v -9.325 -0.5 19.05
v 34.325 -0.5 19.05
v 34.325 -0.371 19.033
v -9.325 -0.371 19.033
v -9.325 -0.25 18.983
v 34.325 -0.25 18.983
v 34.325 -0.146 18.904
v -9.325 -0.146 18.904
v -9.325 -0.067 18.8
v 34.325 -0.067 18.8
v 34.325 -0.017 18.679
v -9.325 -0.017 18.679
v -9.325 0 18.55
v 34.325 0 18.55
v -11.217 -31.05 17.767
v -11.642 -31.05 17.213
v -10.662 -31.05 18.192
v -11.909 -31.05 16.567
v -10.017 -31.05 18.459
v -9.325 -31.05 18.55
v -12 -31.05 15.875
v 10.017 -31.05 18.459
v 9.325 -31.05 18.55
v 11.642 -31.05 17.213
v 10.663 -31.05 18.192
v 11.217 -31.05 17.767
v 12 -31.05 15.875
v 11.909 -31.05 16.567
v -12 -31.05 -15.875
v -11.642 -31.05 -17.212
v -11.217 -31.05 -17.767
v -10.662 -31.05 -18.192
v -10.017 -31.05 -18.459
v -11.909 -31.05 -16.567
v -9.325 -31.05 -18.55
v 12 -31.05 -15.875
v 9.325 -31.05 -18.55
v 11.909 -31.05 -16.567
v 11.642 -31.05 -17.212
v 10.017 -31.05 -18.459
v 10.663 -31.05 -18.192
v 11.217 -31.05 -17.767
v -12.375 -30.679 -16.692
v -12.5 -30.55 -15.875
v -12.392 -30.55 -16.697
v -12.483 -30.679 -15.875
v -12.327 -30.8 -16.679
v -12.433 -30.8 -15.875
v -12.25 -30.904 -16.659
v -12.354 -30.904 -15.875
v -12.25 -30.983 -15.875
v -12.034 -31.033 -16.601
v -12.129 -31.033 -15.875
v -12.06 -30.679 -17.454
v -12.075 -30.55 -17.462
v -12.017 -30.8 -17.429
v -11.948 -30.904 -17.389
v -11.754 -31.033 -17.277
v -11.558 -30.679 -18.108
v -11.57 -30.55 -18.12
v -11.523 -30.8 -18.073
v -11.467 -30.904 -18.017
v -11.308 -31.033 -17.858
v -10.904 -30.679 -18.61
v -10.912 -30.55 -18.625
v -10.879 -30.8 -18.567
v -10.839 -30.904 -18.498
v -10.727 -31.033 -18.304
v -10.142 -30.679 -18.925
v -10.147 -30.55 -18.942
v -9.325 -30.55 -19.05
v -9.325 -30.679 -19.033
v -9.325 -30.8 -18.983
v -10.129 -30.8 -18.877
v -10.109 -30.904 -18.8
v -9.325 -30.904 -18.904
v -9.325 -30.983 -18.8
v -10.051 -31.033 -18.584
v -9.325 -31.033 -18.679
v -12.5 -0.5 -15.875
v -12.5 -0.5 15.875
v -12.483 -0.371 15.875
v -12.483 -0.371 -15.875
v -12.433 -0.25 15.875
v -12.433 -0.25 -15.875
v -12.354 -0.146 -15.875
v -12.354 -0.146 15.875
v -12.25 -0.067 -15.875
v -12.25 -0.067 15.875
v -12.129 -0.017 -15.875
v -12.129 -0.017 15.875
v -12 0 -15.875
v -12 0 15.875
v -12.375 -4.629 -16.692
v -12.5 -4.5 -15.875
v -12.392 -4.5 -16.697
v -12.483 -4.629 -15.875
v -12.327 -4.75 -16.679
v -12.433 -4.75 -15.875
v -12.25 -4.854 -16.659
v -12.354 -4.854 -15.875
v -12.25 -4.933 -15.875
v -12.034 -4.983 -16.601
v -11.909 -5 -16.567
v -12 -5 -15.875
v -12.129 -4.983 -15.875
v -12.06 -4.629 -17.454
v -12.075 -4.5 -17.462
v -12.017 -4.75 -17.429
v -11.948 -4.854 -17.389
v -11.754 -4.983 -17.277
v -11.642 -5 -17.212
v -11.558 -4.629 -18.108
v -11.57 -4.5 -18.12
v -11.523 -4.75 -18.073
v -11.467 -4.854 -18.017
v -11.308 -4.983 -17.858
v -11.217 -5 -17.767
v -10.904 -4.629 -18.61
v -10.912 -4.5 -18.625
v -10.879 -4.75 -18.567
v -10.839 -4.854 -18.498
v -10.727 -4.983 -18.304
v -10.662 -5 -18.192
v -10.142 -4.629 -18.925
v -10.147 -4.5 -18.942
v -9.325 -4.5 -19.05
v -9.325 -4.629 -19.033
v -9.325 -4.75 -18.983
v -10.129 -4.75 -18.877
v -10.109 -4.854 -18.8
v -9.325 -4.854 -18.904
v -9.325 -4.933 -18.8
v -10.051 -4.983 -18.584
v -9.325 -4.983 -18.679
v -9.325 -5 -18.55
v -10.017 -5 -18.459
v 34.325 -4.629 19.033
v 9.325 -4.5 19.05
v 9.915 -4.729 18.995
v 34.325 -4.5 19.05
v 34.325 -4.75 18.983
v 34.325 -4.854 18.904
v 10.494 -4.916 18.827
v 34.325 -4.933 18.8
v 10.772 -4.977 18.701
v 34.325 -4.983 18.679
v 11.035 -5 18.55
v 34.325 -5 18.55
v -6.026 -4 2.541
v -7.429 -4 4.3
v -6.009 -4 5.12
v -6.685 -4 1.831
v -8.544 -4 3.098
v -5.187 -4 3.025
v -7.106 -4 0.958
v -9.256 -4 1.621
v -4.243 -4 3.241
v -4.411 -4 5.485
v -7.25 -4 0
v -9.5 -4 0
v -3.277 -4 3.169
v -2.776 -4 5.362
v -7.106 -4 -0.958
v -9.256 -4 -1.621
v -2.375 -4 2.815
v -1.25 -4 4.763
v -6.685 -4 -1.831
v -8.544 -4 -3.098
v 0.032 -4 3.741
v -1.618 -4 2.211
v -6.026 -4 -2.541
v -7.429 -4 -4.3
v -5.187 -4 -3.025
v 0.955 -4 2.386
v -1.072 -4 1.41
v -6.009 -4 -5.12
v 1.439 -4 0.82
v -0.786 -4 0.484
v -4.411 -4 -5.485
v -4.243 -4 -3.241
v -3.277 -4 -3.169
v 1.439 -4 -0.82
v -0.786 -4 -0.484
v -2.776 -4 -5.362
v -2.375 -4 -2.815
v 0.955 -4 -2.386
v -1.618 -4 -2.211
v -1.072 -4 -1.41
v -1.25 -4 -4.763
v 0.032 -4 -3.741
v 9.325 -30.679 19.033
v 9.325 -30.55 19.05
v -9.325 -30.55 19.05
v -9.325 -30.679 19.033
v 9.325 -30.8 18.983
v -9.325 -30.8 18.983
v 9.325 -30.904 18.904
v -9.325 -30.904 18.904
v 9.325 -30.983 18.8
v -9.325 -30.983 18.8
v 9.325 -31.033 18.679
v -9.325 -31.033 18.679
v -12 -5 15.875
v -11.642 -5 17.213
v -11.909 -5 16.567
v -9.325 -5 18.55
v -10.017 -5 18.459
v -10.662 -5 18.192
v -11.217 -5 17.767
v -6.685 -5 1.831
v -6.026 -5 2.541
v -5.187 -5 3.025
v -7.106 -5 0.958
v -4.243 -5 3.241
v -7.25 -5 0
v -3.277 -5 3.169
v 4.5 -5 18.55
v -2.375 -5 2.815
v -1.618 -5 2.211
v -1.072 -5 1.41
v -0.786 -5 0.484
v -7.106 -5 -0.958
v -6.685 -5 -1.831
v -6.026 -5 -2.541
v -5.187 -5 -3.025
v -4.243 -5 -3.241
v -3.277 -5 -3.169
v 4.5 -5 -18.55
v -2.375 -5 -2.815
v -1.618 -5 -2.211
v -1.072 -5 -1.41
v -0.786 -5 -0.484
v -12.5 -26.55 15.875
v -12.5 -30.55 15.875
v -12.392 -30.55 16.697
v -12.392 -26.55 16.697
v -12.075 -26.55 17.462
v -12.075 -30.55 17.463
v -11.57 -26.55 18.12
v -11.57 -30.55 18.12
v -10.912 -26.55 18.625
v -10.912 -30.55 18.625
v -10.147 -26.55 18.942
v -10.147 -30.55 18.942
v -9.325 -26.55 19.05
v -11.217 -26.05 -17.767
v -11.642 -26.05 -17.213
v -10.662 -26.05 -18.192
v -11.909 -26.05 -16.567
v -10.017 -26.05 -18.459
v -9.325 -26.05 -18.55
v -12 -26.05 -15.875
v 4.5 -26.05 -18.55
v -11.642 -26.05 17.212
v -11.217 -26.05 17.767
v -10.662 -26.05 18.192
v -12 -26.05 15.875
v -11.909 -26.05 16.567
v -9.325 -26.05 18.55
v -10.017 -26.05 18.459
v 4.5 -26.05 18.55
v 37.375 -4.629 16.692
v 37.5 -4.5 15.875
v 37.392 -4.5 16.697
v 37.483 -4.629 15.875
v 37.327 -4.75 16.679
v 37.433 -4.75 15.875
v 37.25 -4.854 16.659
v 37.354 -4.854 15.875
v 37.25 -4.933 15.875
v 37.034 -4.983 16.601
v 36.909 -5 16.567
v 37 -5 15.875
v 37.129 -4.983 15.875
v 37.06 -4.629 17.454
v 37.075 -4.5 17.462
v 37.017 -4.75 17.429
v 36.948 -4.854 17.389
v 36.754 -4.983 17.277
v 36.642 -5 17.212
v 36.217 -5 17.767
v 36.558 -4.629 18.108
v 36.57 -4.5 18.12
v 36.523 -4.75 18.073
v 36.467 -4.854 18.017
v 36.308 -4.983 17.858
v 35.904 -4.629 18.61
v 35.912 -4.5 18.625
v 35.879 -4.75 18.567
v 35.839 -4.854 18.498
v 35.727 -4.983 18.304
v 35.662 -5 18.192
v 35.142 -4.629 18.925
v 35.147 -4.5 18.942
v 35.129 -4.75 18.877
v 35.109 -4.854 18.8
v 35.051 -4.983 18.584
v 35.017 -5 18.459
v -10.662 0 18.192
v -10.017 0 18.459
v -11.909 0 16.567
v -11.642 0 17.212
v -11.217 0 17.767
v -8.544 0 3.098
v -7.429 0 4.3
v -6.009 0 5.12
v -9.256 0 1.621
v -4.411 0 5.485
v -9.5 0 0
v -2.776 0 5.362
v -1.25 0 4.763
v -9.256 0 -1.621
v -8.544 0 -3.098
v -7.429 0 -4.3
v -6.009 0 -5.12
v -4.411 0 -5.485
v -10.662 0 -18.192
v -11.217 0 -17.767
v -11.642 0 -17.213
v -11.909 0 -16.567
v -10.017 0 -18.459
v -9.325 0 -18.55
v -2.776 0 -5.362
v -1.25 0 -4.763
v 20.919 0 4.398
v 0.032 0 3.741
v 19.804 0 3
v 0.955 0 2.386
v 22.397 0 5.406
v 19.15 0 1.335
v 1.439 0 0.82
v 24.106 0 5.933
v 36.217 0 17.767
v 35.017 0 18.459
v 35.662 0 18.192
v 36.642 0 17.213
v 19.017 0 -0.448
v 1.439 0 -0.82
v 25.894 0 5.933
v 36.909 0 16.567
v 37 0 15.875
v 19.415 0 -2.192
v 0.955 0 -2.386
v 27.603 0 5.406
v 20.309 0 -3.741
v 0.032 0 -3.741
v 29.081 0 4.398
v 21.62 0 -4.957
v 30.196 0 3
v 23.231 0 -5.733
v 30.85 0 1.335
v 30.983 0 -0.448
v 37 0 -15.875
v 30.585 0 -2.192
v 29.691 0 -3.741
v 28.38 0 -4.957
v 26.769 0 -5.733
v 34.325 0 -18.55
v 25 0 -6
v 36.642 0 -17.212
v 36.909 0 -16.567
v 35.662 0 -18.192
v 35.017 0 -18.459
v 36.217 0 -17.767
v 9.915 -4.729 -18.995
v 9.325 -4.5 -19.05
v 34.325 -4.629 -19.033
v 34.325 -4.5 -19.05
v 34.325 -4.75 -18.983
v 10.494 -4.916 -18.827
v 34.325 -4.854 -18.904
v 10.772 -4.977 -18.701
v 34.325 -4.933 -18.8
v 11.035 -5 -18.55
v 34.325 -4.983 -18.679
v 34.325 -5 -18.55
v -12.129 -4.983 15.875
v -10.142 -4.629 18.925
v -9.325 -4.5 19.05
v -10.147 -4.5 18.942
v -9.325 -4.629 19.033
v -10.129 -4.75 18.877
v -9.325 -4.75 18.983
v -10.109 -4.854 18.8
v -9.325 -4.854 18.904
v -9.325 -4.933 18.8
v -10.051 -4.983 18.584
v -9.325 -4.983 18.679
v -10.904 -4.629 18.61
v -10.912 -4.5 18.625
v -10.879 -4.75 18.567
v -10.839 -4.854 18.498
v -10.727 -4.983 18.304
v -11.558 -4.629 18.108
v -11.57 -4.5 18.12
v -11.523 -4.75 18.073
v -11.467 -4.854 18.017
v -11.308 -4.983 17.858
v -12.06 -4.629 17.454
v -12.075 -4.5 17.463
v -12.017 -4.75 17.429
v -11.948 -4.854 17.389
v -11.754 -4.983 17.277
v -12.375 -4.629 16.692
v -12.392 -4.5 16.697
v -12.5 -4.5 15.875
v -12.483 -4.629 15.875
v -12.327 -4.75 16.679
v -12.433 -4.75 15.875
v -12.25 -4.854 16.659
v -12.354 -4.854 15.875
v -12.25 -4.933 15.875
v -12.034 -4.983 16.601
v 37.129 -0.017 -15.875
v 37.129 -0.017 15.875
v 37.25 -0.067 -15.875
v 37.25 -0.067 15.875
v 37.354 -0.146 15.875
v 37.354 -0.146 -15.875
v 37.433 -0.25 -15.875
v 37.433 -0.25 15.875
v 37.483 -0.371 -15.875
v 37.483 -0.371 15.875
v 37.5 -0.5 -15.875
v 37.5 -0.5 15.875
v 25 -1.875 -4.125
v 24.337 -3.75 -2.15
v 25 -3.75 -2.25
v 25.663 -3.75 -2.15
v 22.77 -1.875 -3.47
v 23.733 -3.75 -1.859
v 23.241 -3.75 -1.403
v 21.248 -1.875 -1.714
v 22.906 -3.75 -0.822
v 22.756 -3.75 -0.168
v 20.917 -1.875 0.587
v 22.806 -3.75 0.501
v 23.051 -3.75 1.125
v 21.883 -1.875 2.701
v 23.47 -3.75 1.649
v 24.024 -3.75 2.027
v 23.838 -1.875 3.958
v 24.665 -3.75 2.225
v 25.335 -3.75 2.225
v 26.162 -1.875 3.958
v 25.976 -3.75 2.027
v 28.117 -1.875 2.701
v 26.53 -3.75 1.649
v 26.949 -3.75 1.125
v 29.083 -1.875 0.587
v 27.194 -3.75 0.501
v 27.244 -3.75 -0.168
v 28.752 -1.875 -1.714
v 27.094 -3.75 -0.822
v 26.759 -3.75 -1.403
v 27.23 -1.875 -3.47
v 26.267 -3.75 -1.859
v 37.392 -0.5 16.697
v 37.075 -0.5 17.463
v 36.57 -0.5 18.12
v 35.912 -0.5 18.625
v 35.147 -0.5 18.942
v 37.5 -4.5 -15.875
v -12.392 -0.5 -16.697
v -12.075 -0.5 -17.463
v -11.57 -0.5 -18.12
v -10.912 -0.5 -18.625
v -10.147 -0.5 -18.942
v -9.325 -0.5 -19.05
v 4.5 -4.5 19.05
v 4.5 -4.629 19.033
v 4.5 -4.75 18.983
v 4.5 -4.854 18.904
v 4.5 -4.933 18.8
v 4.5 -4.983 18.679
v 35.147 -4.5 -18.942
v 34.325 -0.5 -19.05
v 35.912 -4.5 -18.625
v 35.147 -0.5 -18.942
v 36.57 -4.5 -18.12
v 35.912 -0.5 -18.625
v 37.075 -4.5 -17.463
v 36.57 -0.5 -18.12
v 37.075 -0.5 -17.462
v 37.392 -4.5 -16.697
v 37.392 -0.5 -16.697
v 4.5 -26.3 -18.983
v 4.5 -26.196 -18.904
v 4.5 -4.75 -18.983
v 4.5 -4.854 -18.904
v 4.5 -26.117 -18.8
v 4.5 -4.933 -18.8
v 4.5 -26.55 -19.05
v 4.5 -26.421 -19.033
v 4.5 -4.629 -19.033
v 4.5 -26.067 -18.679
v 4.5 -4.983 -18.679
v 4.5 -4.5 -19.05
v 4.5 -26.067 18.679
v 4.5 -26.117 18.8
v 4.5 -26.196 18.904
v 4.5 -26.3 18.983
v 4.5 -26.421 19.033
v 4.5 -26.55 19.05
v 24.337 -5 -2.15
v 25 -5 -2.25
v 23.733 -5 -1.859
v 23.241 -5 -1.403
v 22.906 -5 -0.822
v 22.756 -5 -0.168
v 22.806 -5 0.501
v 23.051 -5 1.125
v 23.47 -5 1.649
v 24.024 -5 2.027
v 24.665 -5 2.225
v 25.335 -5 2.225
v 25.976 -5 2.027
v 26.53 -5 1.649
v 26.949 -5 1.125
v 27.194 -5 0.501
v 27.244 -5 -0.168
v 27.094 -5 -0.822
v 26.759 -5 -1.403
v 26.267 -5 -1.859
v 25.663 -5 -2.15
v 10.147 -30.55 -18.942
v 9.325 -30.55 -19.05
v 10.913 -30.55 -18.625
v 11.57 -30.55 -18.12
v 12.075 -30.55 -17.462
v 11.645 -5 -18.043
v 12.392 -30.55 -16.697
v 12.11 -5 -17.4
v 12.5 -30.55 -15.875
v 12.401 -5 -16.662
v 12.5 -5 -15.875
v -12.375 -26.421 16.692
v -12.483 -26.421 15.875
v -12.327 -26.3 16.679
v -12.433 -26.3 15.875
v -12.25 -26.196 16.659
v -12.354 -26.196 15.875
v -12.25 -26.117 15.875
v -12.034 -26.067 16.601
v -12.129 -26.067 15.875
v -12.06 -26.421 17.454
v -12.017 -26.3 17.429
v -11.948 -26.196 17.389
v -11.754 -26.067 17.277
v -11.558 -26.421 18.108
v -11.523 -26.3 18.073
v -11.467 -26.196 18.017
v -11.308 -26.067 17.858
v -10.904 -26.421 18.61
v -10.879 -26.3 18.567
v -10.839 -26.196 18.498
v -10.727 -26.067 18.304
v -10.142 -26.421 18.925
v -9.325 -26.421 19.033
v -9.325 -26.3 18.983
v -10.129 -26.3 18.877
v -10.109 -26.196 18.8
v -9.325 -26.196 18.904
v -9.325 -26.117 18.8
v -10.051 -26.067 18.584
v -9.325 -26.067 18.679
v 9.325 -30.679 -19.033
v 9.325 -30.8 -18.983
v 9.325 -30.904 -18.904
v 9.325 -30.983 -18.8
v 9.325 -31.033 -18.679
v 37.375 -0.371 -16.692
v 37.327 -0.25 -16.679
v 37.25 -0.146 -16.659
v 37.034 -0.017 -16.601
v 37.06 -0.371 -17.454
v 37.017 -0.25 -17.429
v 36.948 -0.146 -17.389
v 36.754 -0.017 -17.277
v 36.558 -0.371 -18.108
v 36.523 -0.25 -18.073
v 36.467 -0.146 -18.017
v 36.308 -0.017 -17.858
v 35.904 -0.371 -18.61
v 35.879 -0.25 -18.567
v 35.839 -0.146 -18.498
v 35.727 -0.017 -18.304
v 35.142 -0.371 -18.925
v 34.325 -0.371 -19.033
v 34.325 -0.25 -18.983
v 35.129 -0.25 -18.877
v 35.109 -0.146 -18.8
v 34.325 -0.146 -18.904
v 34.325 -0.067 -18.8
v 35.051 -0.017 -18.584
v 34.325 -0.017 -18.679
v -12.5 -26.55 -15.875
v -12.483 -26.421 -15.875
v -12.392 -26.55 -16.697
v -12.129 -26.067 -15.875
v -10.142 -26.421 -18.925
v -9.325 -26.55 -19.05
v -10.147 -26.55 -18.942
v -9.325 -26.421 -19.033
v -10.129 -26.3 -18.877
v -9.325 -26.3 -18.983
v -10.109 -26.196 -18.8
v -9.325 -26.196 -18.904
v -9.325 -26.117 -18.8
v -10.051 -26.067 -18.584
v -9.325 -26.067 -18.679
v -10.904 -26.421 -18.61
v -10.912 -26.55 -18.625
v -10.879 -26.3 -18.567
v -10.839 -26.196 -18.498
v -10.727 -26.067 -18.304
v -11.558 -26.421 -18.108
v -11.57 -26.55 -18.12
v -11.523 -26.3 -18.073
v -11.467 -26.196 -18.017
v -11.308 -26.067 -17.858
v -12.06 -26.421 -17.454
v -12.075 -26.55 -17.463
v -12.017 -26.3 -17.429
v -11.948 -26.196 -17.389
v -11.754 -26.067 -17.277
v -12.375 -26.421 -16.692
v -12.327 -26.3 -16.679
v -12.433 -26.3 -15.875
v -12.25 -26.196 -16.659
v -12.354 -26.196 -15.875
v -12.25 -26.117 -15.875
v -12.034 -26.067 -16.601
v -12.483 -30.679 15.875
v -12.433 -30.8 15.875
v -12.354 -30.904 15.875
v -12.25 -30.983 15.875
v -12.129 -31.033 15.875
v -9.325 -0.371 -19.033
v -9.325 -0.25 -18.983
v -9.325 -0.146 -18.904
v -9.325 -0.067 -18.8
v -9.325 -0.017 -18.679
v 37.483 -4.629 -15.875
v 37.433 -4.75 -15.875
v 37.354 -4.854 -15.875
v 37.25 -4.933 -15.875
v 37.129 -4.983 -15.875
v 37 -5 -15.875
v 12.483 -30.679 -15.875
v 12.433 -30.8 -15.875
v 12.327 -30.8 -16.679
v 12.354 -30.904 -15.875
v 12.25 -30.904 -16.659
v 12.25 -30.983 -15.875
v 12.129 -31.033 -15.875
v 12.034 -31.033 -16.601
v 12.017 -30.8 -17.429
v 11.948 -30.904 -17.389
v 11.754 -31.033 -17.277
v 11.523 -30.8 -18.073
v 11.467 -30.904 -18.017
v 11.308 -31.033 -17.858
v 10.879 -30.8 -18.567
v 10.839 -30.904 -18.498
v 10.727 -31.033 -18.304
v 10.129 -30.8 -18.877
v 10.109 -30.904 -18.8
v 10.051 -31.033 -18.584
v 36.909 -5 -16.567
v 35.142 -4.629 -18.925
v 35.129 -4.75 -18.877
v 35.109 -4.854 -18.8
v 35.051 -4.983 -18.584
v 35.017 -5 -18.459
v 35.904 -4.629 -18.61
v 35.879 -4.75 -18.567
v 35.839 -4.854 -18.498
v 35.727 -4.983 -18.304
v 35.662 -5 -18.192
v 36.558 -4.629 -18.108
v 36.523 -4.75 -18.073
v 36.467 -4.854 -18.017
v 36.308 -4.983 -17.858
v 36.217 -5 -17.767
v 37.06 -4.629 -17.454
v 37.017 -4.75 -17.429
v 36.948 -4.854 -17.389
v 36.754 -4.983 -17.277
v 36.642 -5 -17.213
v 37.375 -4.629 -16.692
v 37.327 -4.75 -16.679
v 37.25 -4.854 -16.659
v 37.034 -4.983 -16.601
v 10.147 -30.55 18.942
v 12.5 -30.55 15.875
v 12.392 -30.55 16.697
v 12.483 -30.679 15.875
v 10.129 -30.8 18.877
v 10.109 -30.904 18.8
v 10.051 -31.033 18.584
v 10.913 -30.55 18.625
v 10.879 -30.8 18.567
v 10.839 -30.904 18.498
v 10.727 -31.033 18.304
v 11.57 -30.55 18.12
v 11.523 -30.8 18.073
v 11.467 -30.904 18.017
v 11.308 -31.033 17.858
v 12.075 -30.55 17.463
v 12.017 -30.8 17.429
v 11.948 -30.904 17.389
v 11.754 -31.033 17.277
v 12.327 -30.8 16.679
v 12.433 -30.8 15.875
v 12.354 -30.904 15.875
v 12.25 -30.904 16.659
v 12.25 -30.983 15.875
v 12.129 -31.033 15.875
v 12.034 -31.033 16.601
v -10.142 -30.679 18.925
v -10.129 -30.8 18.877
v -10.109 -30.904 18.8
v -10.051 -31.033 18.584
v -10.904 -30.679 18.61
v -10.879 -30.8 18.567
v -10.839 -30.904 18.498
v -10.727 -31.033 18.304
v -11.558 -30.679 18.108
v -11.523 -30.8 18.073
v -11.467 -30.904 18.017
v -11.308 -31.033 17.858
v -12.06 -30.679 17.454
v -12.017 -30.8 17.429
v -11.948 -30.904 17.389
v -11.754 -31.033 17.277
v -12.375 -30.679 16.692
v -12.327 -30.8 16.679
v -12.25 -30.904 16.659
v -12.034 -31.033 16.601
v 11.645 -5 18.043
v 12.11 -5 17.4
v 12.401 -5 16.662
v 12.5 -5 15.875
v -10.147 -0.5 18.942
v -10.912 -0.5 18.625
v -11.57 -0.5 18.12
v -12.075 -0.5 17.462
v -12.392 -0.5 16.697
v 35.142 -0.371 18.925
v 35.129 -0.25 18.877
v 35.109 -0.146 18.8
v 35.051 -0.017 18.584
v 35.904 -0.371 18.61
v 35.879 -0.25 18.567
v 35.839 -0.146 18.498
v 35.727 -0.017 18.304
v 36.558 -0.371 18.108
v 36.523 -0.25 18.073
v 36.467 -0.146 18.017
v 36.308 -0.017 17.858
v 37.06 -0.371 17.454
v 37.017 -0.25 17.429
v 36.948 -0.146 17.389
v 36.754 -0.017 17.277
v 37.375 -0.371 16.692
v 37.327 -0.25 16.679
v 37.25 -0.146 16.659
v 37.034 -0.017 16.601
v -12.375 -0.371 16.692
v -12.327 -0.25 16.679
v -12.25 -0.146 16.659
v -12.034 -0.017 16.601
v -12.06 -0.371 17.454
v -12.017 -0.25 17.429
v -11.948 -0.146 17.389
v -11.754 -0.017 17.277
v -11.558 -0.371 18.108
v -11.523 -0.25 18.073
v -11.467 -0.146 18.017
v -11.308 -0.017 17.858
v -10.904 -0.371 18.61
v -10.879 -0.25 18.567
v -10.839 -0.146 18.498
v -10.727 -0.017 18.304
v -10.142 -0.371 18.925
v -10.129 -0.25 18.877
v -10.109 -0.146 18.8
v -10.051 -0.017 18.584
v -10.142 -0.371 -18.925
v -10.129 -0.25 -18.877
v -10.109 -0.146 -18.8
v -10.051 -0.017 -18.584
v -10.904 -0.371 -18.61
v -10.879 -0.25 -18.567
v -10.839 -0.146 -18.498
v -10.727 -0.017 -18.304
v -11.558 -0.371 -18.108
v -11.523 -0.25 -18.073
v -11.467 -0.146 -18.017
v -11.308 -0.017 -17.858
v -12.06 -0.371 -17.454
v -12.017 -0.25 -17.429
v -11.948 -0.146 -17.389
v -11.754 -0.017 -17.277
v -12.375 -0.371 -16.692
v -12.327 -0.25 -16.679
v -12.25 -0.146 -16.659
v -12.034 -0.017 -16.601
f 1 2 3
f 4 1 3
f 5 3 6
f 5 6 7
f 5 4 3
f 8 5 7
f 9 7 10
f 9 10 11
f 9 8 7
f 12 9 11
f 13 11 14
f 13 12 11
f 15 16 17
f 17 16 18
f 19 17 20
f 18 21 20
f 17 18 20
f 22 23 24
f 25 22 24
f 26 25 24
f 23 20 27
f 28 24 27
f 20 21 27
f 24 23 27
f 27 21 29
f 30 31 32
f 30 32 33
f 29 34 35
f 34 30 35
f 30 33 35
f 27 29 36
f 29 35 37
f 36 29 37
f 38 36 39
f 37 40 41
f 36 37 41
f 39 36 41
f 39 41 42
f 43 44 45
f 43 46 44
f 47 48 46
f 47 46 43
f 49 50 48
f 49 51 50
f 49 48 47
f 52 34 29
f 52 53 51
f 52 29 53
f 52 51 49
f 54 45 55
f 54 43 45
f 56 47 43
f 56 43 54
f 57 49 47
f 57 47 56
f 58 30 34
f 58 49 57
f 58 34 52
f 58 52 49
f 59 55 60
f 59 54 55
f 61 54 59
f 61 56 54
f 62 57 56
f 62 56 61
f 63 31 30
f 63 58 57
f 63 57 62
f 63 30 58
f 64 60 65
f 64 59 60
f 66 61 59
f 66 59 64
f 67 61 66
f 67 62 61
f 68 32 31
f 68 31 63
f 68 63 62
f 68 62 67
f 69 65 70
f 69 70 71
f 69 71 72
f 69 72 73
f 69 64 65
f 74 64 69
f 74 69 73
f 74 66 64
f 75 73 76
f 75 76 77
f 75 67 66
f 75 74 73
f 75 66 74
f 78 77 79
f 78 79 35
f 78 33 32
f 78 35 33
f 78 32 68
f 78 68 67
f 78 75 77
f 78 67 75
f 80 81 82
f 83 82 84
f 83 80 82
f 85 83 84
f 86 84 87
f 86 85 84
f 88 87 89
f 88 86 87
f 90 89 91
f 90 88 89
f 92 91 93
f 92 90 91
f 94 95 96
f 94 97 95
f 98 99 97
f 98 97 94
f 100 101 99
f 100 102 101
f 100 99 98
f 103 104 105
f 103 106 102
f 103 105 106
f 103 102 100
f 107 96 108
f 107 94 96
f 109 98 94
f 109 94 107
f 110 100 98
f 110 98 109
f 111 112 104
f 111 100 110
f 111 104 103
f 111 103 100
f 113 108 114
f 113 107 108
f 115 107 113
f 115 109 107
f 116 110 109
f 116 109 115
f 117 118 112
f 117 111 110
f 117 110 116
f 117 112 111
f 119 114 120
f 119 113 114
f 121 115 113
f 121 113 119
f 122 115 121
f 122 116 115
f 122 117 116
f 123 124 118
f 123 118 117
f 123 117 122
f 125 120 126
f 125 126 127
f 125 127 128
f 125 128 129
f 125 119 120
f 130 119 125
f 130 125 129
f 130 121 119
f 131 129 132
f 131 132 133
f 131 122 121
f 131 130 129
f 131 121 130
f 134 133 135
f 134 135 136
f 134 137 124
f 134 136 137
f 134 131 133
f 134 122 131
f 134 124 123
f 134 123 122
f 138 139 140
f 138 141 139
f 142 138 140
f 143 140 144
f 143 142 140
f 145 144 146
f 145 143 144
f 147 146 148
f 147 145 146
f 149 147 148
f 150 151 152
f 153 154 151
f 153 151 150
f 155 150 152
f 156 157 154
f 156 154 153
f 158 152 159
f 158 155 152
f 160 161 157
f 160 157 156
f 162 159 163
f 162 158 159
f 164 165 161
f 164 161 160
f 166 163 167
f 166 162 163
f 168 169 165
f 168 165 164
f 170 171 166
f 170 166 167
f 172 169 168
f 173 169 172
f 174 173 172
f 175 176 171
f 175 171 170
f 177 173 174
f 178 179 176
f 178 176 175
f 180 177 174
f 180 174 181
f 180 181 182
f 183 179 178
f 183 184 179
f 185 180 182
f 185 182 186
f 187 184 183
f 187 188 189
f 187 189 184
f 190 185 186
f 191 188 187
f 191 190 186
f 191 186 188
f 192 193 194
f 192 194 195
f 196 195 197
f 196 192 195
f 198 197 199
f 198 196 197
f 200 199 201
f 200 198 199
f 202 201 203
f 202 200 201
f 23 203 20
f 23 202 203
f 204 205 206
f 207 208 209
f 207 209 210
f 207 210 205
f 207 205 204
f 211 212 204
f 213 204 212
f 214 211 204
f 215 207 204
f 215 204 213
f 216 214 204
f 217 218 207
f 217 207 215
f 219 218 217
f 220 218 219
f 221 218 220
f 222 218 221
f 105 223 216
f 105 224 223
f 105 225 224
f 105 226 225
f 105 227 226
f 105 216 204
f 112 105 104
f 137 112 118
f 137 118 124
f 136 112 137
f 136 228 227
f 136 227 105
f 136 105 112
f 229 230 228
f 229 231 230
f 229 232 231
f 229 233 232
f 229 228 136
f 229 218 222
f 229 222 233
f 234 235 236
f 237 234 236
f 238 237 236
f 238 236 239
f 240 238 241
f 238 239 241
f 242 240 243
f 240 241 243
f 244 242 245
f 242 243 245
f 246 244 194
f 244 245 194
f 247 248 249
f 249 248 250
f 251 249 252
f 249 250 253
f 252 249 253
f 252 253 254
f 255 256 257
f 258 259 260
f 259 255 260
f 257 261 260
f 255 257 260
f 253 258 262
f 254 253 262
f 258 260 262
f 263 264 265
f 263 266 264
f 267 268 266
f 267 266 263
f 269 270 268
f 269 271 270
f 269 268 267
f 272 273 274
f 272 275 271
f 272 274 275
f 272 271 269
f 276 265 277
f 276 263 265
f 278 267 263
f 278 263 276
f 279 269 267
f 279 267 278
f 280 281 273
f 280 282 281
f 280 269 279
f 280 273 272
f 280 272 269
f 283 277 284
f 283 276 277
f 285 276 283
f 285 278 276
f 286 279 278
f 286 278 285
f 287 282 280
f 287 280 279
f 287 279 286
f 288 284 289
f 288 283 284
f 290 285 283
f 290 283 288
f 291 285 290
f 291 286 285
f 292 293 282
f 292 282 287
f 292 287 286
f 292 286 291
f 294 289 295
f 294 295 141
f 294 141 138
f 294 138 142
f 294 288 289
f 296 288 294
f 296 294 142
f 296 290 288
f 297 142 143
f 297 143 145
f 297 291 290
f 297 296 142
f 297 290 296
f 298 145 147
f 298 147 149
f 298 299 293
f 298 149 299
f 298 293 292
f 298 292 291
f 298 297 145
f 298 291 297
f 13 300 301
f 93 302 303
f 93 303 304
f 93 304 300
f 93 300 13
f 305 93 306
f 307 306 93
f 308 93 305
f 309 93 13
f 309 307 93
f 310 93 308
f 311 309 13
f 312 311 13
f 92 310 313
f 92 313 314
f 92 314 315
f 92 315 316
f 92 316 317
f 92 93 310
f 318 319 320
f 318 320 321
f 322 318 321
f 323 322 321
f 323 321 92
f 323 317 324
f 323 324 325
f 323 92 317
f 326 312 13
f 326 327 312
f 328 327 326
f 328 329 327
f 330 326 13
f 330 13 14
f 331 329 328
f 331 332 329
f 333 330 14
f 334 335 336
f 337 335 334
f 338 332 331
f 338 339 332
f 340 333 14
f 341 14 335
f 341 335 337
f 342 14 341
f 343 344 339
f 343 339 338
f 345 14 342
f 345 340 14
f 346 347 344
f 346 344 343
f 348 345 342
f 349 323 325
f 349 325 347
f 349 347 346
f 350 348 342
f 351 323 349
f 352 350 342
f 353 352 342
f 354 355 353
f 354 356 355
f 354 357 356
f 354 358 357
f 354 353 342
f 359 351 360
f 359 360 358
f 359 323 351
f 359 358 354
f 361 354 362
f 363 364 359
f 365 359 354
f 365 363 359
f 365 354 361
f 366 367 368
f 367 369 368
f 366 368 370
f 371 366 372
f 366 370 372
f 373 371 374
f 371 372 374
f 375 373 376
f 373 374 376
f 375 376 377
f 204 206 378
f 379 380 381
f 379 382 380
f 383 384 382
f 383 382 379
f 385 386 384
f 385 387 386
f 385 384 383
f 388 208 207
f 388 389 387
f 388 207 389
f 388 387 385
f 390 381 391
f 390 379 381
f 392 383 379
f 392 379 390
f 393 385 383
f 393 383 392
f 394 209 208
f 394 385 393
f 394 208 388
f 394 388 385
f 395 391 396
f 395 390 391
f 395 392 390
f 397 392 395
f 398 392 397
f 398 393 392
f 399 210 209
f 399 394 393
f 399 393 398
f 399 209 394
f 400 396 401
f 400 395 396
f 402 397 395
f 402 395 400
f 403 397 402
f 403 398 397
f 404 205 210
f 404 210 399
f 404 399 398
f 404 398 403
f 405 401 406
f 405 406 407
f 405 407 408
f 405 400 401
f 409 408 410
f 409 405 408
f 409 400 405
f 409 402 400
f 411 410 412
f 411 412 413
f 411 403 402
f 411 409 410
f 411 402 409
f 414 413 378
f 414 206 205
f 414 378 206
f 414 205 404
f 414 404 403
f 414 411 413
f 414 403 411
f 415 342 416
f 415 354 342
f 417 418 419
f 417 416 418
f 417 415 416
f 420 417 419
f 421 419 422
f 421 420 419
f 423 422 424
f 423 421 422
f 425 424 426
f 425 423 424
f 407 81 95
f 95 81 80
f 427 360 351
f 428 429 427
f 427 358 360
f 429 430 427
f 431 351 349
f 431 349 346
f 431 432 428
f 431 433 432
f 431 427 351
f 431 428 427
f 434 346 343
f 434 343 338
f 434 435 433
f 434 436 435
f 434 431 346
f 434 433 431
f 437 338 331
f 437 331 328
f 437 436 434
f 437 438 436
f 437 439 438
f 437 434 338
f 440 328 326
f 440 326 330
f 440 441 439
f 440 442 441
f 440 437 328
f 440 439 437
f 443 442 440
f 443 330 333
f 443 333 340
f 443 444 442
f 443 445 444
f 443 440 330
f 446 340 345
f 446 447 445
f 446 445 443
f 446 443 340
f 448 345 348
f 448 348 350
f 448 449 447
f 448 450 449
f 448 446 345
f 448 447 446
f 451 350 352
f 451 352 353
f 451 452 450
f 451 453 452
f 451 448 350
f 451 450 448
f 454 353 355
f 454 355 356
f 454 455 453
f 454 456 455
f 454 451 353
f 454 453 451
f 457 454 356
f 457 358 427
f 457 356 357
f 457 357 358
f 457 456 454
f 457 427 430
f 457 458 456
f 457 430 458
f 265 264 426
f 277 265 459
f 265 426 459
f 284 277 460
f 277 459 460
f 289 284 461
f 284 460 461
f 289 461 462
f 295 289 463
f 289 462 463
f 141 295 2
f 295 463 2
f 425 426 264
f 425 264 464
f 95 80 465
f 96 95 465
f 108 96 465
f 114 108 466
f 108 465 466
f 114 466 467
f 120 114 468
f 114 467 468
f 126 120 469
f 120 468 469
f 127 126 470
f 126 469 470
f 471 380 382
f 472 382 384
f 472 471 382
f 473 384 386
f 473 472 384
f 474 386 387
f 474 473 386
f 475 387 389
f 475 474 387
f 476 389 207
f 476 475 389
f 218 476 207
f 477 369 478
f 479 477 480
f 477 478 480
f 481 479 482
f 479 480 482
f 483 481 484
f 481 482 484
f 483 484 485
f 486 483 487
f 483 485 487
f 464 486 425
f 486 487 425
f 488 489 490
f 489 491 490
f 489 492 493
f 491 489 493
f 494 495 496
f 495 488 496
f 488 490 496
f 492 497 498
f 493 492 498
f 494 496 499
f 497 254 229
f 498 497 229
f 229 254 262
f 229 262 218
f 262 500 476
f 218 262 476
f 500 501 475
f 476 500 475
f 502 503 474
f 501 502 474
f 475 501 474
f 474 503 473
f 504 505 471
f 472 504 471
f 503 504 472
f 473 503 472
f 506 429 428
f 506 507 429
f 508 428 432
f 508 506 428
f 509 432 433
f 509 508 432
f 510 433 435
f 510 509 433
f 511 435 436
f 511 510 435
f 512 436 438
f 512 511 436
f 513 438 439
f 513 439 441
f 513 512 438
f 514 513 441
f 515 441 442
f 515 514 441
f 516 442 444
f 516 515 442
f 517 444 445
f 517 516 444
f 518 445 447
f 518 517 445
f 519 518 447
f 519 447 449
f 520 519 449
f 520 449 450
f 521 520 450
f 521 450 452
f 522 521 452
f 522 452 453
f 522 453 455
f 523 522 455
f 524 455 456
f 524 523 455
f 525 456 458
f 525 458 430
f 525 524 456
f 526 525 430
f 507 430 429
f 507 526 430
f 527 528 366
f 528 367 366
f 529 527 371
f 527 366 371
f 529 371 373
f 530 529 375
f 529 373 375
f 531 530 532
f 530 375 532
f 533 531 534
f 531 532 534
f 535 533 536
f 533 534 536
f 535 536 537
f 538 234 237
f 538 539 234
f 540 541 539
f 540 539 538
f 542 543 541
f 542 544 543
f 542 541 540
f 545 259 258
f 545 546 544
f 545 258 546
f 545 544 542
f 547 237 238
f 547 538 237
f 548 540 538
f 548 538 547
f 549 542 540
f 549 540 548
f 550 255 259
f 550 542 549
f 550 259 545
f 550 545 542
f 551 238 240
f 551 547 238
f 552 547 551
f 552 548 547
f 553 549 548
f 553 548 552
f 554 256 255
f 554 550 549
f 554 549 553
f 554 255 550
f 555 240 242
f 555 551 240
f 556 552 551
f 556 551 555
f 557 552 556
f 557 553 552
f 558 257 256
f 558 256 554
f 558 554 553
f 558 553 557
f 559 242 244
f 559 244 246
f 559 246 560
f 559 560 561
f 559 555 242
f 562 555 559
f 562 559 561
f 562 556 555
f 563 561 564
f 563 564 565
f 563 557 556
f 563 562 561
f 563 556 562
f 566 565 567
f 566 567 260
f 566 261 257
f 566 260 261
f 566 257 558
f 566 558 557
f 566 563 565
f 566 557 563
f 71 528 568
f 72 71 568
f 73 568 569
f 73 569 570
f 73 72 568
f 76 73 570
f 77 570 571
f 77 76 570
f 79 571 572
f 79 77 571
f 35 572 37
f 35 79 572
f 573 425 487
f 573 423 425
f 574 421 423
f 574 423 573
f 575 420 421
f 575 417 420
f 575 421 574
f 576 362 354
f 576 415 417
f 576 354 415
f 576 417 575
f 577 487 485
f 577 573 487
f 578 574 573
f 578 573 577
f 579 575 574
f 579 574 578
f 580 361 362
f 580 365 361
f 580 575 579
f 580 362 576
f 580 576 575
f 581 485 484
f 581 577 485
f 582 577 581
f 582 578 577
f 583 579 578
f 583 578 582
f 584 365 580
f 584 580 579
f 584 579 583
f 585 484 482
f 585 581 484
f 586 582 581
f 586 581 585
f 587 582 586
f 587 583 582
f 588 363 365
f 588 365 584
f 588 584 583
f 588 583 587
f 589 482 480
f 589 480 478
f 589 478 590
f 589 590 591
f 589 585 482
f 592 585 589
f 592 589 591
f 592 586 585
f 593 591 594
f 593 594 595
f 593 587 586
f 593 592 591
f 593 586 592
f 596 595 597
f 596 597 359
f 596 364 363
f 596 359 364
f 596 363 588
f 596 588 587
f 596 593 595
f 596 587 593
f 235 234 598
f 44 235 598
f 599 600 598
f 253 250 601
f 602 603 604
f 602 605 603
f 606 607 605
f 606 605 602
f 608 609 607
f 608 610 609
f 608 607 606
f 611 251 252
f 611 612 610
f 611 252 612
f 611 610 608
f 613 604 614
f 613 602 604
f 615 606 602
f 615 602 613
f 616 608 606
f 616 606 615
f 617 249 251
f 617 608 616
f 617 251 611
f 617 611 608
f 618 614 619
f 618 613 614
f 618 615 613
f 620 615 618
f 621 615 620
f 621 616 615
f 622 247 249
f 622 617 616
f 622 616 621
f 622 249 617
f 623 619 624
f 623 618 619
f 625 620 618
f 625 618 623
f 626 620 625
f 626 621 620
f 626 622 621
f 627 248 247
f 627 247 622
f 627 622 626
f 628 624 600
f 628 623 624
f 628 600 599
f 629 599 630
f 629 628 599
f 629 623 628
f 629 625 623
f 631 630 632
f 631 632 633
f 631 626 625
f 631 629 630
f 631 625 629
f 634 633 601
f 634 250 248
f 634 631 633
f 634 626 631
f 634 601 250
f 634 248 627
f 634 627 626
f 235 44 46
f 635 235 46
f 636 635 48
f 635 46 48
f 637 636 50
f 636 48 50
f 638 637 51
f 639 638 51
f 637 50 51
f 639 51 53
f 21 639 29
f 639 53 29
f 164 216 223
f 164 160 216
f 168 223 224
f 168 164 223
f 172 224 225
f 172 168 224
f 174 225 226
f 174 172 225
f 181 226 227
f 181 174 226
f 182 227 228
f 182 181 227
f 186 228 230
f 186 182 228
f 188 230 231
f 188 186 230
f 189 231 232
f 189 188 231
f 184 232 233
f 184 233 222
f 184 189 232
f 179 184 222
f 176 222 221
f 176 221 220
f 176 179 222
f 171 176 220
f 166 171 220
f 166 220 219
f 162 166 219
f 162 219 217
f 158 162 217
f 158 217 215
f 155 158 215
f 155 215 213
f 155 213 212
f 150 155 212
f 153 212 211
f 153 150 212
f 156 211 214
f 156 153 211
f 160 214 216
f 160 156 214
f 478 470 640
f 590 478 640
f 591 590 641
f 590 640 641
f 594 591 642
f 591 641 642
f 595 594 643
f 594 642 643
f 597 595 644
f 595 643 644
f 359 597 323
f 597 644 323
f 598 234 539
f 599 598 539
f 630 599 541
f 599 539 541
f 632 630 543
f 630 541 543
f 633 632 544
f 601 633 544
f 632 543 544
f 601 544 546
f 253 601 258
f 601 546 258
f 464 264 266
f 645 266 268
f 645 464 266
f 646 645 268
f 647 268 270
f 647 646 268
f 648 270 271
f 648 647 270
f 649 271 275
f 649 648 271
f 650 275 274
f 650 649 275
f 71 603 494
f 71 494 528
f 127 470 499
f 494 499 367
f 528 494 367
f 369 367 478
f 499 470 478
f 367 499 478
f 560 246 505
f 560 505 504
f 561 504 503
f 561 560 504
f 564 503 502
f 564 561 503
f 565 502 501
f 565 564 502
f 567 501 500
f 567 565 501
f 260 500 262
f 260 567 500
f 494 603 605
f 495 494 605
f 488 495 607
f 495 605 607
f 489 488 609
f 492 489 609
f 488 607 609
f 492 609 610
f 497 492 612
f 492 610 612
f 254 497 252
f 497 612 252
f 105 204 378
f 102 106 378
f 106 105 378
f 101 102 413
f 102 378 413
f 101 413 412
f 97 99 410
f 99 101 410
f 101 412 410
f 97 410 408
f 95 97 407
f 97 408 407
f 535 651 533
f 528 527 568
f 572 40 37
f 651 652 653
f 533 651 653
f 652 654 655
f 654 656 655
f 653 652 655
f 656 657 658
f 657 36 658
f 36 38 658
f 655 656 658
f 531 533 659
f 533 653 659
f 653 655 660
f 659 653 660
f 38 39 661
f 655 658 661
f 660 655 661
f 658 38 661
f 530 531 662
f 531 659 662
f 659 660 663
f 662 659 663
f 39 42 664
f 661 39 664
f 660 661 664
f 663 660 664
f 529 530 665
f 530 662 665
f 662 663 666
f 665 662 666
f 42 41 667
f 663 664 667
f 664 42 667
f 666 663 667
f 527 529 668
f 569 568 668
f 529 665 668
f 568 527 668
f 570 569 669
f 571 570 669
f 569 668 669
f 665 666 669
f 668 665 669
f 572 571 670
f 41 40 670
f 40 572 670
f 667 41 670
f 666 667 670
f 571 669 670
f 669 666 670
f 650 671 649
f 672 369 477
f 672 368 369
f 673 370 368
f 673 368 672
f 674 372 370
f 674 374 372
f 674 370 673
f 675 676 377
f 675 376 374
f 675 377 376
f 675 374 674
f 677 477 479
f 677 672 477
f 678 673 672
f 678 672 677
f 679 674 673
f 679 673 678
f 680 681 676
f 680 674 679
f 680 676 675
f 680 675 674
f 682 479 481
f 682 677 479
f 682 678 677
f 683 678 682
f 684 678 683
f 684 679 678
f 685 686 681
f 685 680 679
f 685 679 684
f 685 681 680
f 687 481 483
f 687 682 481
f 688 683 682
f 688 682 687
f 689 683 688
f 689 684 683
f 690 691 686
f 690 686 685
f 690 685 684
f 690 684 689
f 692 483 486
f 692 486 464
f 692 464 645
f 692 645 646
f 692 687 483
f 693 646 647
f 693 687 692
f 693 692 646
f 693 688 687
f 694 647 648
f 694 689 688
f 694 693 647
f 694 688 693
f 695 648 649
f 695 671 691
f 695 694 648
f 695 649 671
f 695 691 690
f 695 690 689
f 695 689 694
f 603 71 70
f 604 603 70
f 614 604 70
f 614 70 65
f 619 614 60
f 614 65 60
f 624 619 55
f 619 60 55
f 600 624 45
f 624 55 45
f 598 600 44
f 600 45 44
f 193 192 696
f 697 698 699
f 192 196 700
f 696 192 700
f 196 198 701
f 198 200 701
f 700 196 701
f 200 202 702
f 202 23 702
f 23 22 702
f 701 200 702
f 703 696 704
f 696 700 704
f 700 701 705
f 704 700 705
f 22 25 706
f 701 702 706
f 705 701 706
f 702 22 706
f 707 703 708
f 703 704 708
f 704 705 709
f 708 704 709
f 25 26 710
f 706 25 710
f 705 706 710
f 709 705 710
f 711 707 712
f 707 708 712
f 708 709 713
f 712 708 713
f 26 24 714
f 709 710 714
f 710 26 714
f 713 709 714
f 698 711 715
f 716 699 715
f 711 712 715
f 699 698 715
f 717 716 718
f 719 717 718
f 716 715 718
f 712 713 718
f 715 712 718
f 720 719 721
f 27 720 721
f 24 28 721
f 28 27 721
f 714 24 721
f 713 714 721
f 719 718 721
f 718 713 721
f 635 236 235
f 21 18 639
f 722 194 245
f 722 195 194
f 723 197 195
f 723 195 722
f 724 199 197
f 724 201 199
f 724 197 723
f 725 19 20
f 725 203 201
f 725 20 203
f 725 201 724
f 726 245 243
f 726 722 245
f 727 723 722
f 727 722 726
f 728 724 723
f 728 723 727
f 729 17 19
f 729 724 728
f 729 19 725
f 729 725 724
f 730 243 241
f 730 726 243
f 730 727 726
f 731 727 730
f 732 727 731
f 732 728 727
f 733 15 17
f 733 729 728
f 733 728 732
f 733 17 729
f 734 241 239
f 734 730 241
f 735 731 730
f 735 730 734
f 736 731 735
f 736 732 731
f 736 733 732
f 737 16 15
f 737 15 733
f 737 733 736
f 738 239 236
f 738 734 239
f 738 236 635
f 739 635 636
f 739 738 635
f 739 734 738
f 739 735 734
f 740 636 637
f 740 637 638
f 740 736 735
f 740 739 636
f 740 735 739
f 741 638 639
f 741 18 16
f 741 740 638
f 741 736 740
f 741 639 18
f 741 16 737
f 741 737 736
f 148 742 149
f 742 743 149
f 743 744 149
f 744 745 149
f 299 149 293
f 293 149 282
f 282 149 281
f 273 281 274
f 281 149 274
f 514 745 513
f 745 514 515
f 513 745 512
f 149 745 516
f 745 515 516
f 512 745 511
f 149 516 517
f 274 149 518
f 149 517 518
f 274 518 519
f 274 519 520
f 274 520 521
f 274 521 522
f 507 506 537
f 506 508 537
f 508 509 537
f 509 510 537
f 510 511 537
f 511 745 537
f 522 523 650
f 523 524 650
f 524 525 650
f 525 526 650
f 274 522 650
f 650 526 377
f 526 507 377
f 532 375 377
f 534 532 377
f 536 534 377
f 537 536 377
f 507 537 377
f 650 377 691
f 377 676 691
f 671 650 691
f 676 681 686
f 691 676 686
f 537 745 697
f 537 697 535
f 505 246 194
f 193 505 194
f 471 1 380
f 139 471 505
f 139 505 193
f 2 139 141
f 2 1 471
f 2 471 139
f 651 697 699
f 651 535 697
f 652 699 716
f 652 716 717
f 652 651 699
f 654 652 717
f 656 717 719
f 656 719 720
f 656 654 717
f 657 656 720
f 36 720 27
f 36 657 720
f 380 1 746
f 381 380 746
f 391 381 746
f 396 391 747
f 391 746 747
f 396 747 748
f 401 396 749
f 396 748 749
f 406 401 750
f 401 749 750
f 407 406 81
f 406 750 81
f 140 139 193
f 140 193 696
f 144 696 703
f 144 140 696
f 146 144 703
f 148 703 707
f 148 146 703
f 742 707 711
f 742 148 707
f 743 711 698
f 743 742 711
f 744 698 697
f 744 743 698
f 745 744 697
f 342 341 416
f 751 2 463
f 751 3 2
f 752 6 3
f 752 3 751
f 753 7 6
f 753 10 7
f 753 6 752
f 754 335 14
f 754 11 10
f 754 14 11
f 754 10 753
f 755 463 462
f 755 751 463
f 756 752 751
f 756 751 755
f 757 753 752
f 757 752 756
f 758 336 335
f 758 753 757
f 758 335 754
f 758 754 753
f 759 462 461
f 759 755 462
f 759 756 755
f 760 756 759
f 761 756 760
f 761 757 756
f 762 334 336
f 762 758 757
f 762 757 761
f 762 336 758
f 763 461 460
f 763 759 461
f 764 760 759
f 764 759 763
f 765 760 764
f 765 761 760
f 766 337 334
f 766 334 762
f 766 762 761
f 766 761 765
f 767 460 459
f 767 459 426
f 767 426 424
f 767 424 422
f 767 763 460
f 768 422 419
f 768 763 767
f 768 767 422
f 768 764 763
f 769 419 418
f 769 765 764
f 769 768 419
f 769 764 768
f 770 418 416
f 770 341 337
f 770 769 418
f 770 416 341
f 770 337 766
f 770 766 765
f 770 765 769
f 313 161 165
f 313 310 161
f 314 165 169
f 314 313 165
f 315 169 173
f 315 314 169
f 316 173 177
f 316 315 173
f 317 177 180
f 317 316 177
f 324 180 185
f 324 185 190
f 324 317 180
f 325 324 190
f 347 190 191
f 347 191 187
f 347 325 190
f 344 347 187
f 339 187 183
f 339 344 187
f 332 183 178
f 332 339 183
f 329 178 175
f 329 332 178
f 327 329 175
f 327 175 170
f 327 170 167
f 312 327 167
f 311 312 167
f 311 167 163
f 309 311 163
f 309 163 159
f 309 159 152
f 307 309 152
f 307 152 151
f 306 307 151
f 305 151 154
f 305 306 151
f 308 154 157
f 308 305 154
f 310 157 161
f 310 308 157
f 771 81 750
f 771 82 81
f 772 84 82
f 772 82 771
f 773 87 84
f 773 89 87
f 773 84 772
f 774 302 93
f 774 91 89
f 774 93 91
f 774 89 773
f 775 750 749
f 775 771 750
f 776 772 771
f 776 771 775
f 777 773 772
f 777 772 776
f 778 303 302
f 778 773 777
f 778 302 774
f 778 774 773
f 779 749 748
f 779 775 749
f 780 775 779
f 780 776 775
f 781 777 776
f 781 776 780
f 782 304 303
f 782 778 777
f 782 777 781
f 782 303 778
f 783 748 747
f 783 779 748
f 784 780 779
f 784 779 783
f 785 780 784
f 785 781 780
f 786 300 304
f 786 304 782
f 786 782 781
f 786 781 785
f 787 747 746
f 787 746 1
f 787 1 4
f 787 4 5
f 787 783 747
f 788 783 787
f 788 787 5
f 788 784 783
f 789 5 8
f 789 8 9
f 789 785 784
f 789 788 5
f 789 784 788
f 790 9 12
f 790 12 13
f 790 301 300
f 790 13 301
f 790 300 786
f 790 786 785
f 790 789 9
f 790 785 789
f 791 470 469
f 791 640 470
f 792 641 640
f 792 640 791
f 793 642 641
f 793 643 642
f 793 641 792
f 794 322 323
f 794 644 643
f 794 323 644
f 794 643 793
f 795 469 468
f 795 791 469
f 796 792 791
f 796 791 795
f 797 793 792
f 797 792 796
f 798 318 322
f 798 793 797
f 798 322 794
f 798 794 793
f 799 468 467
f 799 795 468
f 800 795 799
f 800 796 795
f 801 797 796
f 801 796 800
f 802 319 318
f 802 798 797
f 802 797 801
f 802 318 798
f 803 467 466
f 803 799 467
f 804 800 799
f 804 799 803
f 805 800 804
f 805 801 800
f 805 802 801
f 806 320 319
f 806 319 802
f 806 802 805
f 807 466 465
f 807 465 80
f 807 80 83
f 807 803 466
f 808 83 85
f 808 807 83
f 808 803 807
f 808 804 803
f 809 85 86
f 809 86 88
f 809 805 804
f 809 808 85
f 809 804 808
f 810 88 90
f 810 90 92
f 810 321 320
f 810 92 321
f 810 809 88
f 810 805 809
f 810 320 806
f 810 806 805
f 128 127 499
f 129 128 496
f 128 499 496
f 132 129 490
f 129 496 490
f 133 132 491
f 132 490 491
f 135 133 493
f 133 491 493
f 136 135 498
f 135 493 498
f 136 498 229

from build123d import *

# Parameters (mm, degrees)
SKETCH1_W           = 25
SKETCH1_H           = 68.1
BOSS_EXTRUDE1_DEPTH = 31.05
CUT_EXTRUDE1_REACH  = 54.426
SKETCH2_W           = 15
SKETCH2_H           = 26.05
SKETCH3_W           = 17
SKETCH3_H           = 21.05
CUT_EXTRUDE2_DEPTH  = 25
SKETCH7_W           = 25
SKETCH7_H           = 38.1
BOSS_EXTRUDE2_DEPTH = 5
SKETCH11_W          = 25
SKETCH11_H          = 15
CUT_EXTRUDE3_DEPTH  = 5
FILLET1_R           = 3.175
FILLET2_R           = 0.5
FILLET3_R           = 3.175


with BuildPart() as part:
    # Sketch1 → Boss-Extrude1 (new body)
    with BuildSketch(Plane(origin=(0, 0, 0), x_dir=(1, 0, 0), z_dir=(0, 1, 0))):
        Rectangle(SKETCH1_W, SKETCH1_H)
    extrude(amount=-BOSS_EXTRUDE1_DEPTH)

    # Sketch2 → Cut-Extrude1 (cut, up to next)
    with BuildSketch(Plane(origin=(12.5, 0, 0), x_dir=(0, 0, -1), z_dir=(1, 0, 0)), mode=Mode.PRIVATE) as cut_extrude1_sk1:
        with Locations((-26.55, -18.025)):
            Rectangle(SKETCH2_W, SKETCH2_H)
    cut_extrude1_tool1 = extrude(cut_extrude1_sk1.sketch, amount=-CUT_EXTRUDE1_REACH, mode=Mode.PRIVATE) & part.part
    # Sketch2 → Cut-Extrude1 (cut, up to next)
    with BuildSketch(Plane(origin=(12.5, 0, 0), x_dir=(0, 0, -1), z_dir=(1, 0, 0)), mode=Mode.PRIVATE) as cut_extrude1_sk2:
        with Locations((26.55, -18.025)):
            Rectangle(SKETCH2_W, SKETCH2_H)
    cut_extrude1_tool2 = extrude(cut_extrude1_sk2.sketch, amount=-CUT_EXTRUDE1_REACH, mode=Mode.PRIVATE) & part.part
    add(cut_extrude1_tool1.solids().sort_by_distance((12.5, -18.025, 26.55))[0], mode=Mode.SUBTRACT)
    add(cut_extrude1_tool2.solids().sort_by_distance((12.5, -18.025, -26.55))[0], mode=Mode.SUBTRACT)

    # Sketch3 → Cut-Extrude2 (cut, symmetric)
    with BuildSketch(Plane.XY):
        with Locations((-4, -15.525)):
            Rectangle(SKETCH3_W, SKETCH3_H)
    extrude(amount=CUT_EXTRUDE2_DEPTH, both=True, mode=Mode.SUBTRACT)

    # Sketch6 → Cut-Revolve2 (revolve, cut)
    with BuildSketch(Plane.XY, mode=Mode.PRIVATE) as cut_revolve2_sk:
        Polygon((-4, 0), (-4, -5), (-0.75, -5), (-0.75, -4), (1.5, -4), (1.5, 0), align=None)
    revolve(cut_revolve2_sk.sketch.rotate(Axis((-4, 0, 0), (0, -1, 0)), 180), axis=Axis((-4, 0, 0), (0, -1, 0)), mode=Mode.SUBTRACT)

    # Sketch7 → Boss-Extrude2 (add)
    with BuildSketch(Plane(origin=(0, 0, 0), x_dir=(1, 0, 0), z_dir=(0, 1, 0))):
        with Locations((25, 0)):
            Rectangle(SKETCH7_W, SKETCH7_H)
    extrude(amount=-BOSS_EXTRUDE2_DEPTH)

    # Sketch10 → Cut-Revolve3 (revolve, cut)
    with BuildSketch(Plane.XY, mode=Mode.PRIVATE) as cut_revolve3_sk:
        Polygon((25, 0), (19, 0), (22.75, -3.75), (22.75, -5), (25, -5), align=None)
    revolve(cut_revolve3_sk.sketch.rotate(Axis((25, -5, 0), (0, 1, 0)), 270), axis=Axis((25, -5, 0), (0, 1, 0)), mode=Mode.SUBTRACT)

    # Sketch11 → Cut-Extrude3 (cut)
    with BuildSketch(Plane(origin=(0, 0, 0), x_dir=(1, 0, 0), z_dir=(0, 1, 0))):
        with Locations((0, 26.55)):
            Rectangle(SKETCH11_W, SKETCH11_H)
        with Locations((0, -26.55)):
            Rectangle(SKETCH11_W, SKETCH11_H)
    extrude(amount=-CUT_EXTRUDE3_DEPTH, mode=Mode.SUBTRACT)

    # Fillet1
    fillet1_edges = [part.edges().sort_by_distance(p)[0] for p in [
        (12.5, -18.025, 19.05),
        (12.5, -18.025, -19.05),
    ]]
    fillet(fillet1_edges, radius=FILLET1_R)

    # Fillet2
    fillet2_edges = [part.edges().sort_by_distance(p)[0] for p in [
        (-4, -5, 19.05),
        (12.5, -31.05, 0),
        (11.57006403, -31.05, -18.12006403),
        (11.57006403, -31.05, 18.12006403),
        (-12.5, -31.05, 0),
        (-1.5875, -31.05, 19.05),
        (-1.5875, -31.05, -19.05),
        (-4, -26.05, 19.05),
        (-12.5, -26.05, 0),
        (-4, -26.05, -19.05),
        (12.5, 0, -19.05),
        (12.5, 0, 19.05),
        (37.5, 0, 0),
        (23.4125, -5, -19.05),
        (37.5, -5, 0),
        (23.4125, -5, 19.05),
        (-12.5, -5, 0),
        (-4, -5, -19.05),
        (-12.5, 0, 0),
    ]]
    fillet(fillet2_edges, radius=FILLET2_R)

    # Fillet3
    # the kernel refuses this fillet: 3.175 mm, written as the material it takes off along each edge
    with BuildSketch(Plane(origin=(-9.325, -31.05, -15.875), x_dir=(-1, 0, 0), z_dir=(0, 0, 1))) as fillet3_piece_1:
        with BuildLine():
            CenterArc((2.675, -0.5), 0.5, 0, 90)
            Line((3.175, -0.5), (3.175, 0))
            Line((3.175, 0), (2.675, 0))
        make_face()
    revolve(axis=Axis((-9.325, -31.05, -15.875), (0, -1, 0)), revolution_arc=90, mode=Mode.SUBTRACT)
    with BuildSketch(Plane(origin=(-9.325, -31.05, 15.875), x_dir=(0, 0, 1), z_dir=(1, 0, 0))) as fillet3_piece_2:
        with BuildLine():
            CenterArc((2.675, -0.5), 0.5, 0, 90)
            Line((3.175, -0.5), (3.175, 0))
            Line((3.175, 0), (2.675, 0))
        make_face()
    revolve(axis=Axis((-9.325, -31.05, 15.875), (0, -1, 0)), revolution_arc=90, mode=Mode.SUBTRACT)
    with BuildSketch(Plane(origin=(-9.325, -26.05, -15.875), x_dir=(0, 0, -1), z_dir=(1, 0, 0))) as fillet3_piece_3:
        with BuildLine():
            CenterArc((2.675, -0.5), 0.5, 0, 90)
            Line((3.175, -0.5), (3.175, 0))
            Line((3.175, 0), (2.675, 0))
        make_face()
    revolve(axis=Axis((-9.325, -26.05, -15.875), (0, 1, 0)), revolution_arc=90, mode=Mode.SUBTRACT)
    with BuildSketch(Plane(origin=(-9.325, -26.05, 15.875), x_dir=(-1, 0, 0), z_dir=(0, 0, -1))) as fillet3_piece_4:
        with BuildLine():
            CenterArc((2.675, -0.5), 0.5, 0, 90)
            Line((3.175, -0.5), (3.175, 0))
            Line((3.175, 0), (2.675, 0))
        make_face()
    revolve(axis=Axis((-9.325, -26.05, 15.875), (0, 1, 0)), revolution_arc=90, mode=Mode.SUBTRACT)
    with BuildSketch(Plane(origin=(-9.325, 0, 15.875), x_dir=(-1, 0, 0), z_dir=(0, 0, -1))) as fillet3_piece_5:
        with BuildLine():
            CenterArc((2.675, -0.5), 0.5, 0, 90)
            Line((3.175, -0.5), (3.175, 0))
            Line((3.175, 0), (2.675, 0))
        make_face()
    revolve(axis=Axis((-9.325, 0, 15.875), (0, 1, 0)), revolution_arc=90, mode=Mode.SUBTRACT)
    with BuildSketch(Plane(origin=(-9.325, 0, -15.875), x_dir=(0, 0, -1), z_dir=(1, 0, 0))) as fillet3_piece_6:
        with BuildLine():
            CenterArc((2.675, -0.5), 0.5, 0, 90)
            Line((3.175, -0.5), (3.175, 0))
            Line((3.175, 0), (2.675, 0))
        make_face()
    revolve(axis=Axis((-9.325, 0, -15.875), (0, 1, 0)), revolution_arc=90, mode=Mode.SUBTRACT)
    with BuildSketch(Plane(origin=(34.325, 0, 15.875), x_dir=(0, 0, 1), z_dir=(-1, 0, 0))) as fillet3_piece_7:
        with BuildLine():
            CenterArc((2.675, -0.5), 0.5, 0, 90)
            Line((3.175, -0.5), (3.175, 0))
            Line((3.175, 0), (2.675, 0))
        make_face()
    revolve(axis=Axis((34.325, 0, 15.875), (0, 1, 0)), revolution_arc=90, mode=Mode.SUBTRACT)
    with BuildSketch(Plane(origin=(34.325, 0, -15.875), x_dir=(1, 0, 0), z_dir=(0, 0, 1))) as fillet3_piece_8:
        with BuildLine():
            CenterArc((2.675, -0.5), 0.5, 0, 90)
            Line((3.175, -0.5), (3.175, 0))
            Line((3.175, 0), (2.675, 0))
        make_face()
    revolve(axis=Axis((34.325, 0, -15.875), (0, 1, 0)), revolution_arc=90, mode=Mode.SUBTRACT)
    with BuildSketch(Plane(origin=(-9.325, -5, 15.875), x_dir=(0, 0, 1), z_dir=(1, 0, 0))) as fillet3_piece_9:
        with BuildLine():
            CenterArc((2.675, -0.5), 0.5, 0, 90)
            Line((3.175, -0.5), (3.175, 0))
            Line((3.175, 0), (2.675, 0))
        make_face()
    revolve(axis=Axis((-9.325, -5, 15.875), (0, -1, 0)), revolution_arc=90, mode=Mode.SUBTRACT)
    with BuildSketch(Plane(origin=(-9.325, -5, -15.875), x_dir=(-1, 0, 0), z_dir=(0, 0, 1))) as fillet3_piece_10:
        with BuildLine():
            CenterArc((2.675, -0.5), 0.5, 0, 90)
            Line((3.175, -0.5), (3.175, 0))
            Line((3.175, 0), (2.675, 0))
        make_face()
    revolve(axis=Axis((-9.325, -5, -15.875), (0, -1, 0)), revolution_arc=90, mode=Mode.SUBTRACT)
    with BuildSketch(Plane(origin=(34.325, -5, -15.875), x_dir=(0, 0, -1), z_dir=(-1, 0, 0))) as fillet3_piece_11:
        with BuildLine():
            CenterArc((2.675, -0.5), 0.5, 0, 90)
            Line((3.175, -0.5), (3.175, 0))
            Line((3.175, 0), (2.675, 0))
        make_face()
    revolve(axis=Axis((34.325, -5, -15.875), (0, -1, 0)), revolution_arc=90, mode=Mode.SUBTRACT)
    with BuildSketch(Plane(origin=(34.325, -5, 15.875), x_dir=(1, 0, 0), z_dir=(0, 0, -1))) as fillet3_piece_12:
        with BuildLine():
            CenterArc((2.675, -0.5), 0.5, 0, 90)
            Line((3.175, -0.5), (3.175, 0))
            Line((3.175, 0), (2.675, 0))
        make_face()
    revolve(axis=Axis((34.325, -5, 15.875), (0, -1, 0)), revolution_arc=90, mode=Mode.SUBTRACT)
    with BuildSketch(Plane(origin=(37.5, 0, 19.05), x_dir=(0, 0, -1), z_dir=(0, -1, 0)), Plane(origin=(-12.5, -31.05, 19.05), x_dir=(0, 0, -1), z_dir=(0, 1, 0)), Plane(origin=(-12.5, -31.05, -19.05), x_dir=(1, 0, 0), z_dir=(0, 1, 0)), Plane(origin=(37.5, 0, -19.05), x_dir=(-1, 0, 0), z_dir=(0, -1, 0))) as fillet3_piece_13:
        with BuildLine():
            CenterArc((FILLET3_R, -FILLET3_R), FILLET3_R, 90, 90)
            Line((0, -FILLET3_R), (0, 0))
            Line((0, 0), (FILLET3_R, 0))
        make_face()
    extrude(amount=5, mode=Mode.SUBTRACT)
    with BuildSketch(Plane(origin=(-12.5, 0, 19.05), x_dir=(0, 0, -1), z_dir=(0, -1, 0)), Plane(origin=(-12.5, 0, -19.05), x_dir=(1, 0, 0), z_dir=(0, -1, 0))) as fillet3_piece_14:
        with BuildLine():
            CenterArc((FILLET3_R, FILLET3_R), FILLET3_R, 180, 90)
            Line((0, FILLET3_R), (0, 0))
            Line((0, 0), (FILLET3_R, 0))
        make_face()
    extrude(amount=5, mode=Mode.SUBTRACT)


solid = part.part
